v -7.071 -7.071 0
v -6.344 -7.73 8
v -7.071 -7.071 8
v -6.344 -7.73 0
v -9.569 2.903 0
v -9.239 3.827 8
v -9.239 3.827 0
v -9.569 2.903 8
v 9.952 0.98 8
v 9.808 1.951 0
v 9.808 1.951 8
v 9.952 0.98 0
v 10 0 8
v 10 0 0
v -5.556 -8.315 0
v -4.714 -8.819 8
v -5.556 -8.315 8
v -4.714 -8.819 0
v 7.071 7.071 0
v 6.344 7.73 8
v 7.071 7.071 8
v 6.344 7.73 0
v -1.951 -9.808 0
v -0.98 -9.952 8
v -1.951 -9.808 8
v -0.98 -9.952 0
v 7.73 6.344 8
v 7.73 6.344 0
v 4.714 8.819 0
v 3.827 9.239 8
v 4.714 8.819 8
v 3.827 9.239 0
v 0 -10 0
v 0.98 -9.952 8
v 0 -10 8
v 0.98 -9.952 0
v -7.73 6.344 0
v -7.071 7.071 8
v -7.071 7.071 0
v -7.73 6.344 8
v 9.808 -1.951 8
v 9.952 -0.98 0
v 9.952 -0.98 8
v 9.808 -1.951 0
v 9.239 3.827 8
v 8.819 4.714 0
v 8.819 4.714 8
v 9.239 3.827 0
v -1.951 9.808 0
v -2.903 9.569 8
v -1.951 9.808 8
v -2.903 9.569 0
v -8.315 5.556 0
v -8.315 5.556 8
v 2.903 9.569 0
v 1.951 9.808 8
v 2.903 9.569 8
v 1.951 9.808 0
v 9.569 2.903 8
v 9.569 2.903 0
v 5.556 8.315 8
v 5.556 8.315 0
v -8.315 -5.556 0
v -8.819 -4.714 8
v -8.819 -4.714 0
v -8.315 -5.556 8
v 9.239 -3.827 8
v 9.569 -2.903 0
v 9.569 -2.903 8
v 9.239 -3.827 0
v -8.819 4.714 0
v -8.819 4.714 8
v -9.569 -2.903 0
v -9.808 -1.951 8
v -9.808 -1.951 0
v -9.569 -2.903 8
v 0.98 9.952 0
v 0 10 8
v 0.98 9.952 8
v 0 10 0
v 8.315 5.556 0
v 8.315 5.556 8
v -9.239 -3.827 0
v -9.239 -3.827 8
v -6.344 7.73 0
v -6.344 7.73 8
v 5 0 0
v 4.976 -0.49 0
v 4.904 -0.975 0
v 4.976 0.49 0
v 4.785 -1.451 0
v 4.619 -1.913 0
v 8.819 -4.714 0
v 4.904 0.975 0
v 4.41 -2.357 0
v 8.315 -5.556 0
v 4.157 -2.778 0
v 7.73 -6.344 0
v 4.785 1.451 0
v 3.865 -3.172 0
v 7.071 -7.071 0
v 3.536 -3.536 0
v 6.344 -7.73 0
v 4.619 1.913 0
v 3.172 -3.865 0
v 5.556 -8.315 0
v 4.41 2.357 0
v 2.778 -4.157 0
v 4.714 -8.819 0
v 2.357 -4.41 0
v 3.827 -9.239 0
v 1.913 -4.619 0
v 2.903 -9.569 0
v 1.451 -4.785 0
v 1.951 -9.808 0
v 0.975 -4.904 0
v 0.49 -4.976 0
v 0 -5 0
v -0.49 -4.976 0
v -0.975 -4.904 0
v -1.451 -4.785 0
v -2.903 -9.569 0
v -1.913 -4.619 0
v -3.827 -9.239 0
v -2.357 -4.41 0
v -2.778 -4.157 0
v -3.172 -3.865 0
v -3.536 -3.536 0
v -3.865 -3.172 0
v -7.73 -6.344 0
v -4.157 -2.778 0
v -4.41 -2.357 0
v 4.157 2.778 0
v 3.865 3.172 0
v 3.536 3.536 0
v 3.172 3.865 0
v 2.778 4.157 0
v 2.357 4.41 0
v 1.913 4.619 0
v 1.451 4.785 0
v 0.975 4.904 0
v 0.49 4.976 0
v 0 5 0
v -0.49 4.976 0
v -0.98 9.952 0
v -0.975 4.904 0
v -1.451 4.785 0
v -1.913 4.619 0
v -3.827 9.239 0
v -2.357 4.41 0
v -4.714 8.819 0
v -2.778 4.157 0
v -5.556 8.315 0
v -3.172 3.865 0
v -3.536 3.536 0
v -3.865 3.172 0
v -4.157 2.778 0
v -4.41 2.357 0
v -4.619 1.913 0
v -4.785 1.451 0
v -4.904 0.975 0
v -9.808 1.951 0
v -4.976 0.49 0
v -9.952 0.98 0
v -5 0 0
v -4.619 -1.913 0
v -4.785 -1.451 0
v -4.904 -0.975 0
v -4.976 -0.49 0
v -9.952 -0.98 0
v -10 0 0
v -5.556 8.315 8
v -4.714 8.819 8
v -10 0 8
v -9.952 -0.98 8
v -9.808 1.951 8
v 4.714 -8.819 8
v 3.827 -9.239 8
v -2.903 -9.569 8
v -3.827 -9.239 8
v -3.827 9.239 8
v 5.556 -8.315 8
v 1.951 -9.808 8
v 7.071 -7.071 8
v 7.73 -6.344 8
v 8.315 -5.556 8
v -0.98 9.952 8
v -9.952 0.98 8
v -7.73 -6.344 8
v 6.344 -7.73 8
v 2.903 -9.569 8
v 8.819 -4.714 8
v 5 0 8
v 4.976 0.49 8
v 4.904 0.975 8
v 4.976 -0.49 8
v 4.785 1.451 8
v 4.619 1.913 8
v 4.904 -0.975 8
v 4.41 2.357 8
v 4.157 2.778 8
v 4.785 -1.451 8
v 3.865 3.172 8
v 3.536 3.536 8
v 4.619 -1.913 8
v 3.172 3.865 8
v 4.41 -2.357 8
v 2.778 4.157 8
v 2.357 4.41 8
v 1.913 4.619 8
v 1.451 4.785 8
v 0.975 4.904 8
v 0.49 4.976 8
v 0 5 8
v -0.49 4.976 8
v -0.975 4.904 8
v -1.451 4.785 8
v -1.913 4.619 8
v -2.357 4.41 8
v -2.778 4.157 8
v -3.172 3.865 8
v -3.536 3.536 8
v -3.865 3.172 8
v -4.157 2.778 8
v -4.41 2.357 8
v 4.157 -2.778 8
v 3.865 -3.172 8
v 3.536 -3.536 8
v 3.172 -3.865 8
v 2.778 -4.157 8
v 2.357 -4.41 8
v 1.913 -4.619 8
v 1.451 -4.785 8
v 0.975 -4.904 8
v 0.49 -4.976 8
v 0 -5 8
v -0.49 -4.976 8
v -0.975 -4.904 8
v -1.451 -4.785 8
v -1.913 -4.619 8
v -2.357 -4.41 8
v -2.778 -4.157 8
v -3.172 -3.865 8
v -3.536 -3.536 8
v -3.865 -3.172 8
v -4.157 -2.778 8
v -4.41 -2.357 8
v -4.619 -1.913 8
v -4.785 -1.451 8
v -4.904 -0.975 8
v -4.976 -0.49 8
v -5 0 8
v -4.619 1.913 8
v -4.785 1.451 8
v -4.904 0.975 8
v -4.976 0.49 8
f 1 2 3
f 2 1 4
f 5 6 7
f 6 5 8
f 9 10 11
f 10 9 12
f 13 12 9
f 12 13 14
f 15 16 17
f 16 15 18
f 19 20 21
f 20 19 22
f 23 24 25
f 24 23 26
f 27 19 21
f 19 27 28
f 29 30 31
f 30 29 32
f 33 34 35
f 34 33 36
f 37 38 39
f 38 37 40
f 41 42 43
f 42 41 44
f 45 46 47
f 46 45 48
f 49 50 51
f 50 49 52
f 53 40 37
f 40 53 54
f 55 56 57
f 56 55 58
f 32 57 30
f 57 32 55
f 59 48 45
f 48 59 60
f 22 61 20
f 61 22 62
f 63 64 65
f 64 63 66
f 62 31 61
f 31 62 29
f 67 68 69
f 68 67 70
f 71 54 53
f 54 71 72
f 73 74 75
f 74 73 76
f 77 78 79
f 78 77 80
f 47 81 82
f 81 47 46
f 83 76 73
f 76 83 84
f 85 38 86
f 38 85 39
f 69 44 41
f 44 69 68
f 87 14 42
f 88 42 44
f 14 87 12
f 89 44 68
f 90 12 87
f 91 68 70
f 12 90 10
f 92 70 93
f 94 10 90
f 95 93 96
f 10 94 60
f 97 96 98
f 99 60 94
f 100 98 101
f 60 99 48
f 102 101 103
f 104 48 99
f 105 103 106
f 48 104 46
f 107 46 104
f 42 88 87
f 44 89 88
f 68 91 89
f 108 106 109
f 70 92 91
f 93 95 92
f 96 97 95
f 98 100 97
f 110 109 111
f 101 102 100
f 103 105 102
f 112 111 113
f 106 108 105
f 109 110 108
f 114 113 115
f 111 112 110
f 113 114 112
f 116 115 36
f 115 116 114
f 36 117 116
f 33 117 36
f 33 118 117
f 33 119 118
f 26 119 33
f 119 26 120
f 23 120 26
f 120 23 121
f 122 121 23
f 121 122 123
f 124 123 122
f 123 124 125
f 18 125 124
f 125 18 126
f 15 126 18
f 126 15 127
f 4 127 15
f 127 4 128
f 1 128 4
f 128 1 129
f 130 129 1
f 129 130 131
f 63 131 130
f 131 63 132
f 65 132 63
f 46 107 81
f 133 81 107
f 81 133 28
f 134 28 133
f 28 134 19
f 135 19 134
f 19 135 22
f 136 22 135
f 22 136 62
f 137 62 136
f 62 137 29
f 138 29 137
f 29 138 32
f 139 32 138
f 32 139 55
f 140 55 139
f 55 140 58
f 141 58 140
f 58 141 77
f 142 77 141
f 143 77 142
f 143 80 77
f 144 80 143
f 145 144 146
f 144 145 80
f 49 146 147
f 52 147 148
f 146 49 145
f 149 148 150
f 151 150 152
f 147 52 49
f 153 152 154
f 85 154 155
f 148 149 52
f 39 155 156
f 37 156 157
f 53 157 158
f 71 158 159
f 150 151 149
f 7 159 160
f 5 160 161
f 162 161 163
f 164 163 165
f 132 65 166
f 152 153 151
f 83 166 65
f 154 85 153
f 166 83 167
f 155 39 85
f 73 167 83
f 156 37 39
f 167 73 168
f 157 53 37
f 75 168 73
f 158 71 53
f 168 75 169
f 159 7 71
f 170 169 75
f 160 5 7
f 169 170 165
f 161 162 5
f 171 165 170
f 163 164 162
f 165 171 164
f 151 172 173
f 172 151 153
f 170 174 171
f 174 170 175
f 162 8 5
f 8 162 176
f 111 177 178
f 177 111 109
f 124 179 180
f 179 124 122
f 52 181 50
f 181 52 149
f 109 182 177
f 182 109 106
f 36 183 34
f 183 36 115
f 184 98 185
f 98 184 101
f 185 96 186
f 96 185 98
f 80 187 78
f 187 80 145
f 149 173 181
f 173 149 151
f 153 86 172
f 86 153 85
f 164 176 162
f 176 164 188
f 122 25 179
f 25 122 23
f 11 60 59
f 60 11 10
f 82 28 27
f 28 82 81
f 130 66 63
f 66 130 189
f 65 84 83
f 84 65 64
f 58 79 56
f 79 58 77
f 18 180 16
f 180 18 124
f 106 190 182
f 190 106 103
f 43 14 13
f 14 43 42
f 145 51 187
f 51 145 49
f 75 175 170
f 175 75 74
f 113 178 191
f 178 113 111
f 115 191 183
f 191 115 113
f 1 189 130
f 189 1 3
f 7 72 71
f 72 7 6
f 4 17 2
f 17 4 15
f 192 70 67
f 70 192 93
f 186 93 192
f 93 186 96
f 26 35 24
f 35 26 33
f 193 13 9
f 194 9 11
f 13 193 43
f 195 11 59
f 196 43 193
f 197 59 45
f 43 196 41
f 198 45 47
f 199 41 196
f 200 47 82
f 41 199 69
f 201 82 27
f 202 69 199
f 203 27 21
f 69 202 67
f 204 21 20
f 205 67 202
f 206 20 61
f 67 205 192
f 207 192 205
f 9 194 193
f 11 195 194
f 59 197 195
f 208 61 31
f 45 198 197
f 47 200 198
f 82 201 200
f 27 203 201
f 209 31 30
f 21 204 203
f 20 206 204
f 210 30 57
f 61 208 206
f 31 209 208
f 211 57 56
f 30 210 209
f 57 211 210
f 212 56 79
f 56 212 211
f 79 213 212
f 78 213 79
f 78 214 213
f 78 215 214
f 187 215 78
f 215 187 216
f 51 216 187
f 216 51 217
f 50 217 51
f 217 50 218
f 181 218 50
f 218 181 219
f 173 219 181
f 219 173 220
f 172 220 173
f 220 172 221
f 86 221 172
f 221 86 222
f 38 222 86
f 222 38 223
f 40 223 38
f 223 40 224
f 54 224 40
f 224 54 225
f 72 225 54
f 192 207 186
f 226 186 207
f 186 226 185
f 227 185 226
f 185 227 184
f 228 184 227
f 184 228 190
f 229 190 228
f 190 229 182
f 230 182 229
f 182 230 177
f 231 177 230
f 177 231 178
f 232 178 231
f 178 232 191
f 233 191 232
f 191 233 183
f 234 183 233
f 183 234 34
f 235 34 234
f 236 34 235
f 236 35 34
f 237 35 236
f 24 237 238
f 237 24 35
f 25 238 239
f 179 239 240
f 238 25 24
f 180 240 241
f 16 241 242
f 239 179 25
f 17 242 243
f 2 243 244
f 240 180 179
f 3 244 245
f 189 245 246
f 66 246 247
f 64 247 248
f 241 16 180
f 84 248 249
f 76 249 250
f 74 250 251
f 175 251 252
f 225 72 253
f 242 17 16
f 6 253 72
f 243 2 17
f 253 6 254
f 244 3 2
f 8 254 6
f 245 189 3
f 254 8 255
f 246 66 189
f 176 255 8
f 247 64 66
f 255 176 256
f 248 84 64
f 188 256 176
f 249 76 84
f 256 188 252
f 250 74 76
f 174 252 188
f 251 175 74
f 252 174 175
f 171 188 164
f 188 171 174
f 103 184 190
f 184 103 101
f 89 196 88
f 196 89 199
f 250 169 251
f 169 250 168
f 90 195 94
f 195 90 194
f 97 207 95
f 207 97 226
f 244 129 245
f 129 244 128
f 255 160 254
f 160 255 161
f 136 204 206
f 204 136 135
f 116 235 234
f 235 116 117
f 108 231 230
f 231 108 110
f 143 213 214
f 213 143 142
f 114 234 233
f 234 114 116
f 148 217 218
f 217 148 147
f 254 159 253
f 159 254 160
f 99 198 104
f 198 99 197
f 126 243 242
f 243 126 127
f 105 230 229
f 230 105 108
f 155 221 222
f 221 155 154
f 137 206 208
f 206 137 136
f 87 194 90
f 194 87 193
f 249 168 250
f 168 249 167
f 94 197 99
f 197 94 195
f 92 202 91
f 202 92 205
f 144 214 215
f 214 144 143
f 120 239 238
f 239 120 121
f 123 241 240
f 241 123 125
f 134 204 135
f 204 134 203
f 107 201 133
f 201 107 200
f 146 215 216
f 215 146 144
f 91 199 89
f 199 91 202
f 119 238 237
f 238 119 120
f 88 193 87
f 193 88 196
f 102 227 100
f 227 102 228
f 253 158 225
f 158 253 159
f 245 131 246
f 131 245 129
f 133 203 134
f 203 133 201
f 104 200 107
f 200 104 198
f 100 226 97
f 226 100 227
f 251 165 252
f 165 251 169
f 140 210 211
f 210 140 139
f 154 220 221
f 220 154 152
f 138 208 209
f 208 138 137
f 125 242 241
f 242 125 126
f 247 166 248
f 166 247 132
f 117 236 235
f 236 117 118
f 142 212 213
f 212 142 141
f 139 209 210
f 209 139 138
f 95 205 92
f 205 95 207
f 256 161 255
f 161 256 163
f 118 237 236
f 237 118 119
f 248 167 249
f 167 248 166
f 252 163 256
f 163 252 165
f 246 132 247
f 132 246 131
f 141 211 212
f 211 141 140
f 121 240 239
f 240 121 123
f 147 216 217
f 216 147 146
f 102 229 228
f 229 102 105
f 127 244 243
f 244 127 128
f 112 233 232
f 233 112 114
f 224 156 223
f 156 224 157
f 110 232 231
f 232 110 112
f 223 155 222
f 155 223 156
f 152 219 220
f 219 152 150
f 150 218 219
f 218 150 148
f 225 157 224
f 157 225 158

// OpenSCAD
// bushing_param.scad
// param: inner_d=10, outer_d=20, thickness=8
module param_bushing(inner_d=10, outer_d=20, thickness=8) {
    difference() {
        cylinder(h = thickness, r=outer_d/2, $fn=64);
        cylinder(h = thickness+2, r=inner_d/2, $fn=64);
    }
}
param_bushing(inner_d=10, outer_d=20, thickness=8);
